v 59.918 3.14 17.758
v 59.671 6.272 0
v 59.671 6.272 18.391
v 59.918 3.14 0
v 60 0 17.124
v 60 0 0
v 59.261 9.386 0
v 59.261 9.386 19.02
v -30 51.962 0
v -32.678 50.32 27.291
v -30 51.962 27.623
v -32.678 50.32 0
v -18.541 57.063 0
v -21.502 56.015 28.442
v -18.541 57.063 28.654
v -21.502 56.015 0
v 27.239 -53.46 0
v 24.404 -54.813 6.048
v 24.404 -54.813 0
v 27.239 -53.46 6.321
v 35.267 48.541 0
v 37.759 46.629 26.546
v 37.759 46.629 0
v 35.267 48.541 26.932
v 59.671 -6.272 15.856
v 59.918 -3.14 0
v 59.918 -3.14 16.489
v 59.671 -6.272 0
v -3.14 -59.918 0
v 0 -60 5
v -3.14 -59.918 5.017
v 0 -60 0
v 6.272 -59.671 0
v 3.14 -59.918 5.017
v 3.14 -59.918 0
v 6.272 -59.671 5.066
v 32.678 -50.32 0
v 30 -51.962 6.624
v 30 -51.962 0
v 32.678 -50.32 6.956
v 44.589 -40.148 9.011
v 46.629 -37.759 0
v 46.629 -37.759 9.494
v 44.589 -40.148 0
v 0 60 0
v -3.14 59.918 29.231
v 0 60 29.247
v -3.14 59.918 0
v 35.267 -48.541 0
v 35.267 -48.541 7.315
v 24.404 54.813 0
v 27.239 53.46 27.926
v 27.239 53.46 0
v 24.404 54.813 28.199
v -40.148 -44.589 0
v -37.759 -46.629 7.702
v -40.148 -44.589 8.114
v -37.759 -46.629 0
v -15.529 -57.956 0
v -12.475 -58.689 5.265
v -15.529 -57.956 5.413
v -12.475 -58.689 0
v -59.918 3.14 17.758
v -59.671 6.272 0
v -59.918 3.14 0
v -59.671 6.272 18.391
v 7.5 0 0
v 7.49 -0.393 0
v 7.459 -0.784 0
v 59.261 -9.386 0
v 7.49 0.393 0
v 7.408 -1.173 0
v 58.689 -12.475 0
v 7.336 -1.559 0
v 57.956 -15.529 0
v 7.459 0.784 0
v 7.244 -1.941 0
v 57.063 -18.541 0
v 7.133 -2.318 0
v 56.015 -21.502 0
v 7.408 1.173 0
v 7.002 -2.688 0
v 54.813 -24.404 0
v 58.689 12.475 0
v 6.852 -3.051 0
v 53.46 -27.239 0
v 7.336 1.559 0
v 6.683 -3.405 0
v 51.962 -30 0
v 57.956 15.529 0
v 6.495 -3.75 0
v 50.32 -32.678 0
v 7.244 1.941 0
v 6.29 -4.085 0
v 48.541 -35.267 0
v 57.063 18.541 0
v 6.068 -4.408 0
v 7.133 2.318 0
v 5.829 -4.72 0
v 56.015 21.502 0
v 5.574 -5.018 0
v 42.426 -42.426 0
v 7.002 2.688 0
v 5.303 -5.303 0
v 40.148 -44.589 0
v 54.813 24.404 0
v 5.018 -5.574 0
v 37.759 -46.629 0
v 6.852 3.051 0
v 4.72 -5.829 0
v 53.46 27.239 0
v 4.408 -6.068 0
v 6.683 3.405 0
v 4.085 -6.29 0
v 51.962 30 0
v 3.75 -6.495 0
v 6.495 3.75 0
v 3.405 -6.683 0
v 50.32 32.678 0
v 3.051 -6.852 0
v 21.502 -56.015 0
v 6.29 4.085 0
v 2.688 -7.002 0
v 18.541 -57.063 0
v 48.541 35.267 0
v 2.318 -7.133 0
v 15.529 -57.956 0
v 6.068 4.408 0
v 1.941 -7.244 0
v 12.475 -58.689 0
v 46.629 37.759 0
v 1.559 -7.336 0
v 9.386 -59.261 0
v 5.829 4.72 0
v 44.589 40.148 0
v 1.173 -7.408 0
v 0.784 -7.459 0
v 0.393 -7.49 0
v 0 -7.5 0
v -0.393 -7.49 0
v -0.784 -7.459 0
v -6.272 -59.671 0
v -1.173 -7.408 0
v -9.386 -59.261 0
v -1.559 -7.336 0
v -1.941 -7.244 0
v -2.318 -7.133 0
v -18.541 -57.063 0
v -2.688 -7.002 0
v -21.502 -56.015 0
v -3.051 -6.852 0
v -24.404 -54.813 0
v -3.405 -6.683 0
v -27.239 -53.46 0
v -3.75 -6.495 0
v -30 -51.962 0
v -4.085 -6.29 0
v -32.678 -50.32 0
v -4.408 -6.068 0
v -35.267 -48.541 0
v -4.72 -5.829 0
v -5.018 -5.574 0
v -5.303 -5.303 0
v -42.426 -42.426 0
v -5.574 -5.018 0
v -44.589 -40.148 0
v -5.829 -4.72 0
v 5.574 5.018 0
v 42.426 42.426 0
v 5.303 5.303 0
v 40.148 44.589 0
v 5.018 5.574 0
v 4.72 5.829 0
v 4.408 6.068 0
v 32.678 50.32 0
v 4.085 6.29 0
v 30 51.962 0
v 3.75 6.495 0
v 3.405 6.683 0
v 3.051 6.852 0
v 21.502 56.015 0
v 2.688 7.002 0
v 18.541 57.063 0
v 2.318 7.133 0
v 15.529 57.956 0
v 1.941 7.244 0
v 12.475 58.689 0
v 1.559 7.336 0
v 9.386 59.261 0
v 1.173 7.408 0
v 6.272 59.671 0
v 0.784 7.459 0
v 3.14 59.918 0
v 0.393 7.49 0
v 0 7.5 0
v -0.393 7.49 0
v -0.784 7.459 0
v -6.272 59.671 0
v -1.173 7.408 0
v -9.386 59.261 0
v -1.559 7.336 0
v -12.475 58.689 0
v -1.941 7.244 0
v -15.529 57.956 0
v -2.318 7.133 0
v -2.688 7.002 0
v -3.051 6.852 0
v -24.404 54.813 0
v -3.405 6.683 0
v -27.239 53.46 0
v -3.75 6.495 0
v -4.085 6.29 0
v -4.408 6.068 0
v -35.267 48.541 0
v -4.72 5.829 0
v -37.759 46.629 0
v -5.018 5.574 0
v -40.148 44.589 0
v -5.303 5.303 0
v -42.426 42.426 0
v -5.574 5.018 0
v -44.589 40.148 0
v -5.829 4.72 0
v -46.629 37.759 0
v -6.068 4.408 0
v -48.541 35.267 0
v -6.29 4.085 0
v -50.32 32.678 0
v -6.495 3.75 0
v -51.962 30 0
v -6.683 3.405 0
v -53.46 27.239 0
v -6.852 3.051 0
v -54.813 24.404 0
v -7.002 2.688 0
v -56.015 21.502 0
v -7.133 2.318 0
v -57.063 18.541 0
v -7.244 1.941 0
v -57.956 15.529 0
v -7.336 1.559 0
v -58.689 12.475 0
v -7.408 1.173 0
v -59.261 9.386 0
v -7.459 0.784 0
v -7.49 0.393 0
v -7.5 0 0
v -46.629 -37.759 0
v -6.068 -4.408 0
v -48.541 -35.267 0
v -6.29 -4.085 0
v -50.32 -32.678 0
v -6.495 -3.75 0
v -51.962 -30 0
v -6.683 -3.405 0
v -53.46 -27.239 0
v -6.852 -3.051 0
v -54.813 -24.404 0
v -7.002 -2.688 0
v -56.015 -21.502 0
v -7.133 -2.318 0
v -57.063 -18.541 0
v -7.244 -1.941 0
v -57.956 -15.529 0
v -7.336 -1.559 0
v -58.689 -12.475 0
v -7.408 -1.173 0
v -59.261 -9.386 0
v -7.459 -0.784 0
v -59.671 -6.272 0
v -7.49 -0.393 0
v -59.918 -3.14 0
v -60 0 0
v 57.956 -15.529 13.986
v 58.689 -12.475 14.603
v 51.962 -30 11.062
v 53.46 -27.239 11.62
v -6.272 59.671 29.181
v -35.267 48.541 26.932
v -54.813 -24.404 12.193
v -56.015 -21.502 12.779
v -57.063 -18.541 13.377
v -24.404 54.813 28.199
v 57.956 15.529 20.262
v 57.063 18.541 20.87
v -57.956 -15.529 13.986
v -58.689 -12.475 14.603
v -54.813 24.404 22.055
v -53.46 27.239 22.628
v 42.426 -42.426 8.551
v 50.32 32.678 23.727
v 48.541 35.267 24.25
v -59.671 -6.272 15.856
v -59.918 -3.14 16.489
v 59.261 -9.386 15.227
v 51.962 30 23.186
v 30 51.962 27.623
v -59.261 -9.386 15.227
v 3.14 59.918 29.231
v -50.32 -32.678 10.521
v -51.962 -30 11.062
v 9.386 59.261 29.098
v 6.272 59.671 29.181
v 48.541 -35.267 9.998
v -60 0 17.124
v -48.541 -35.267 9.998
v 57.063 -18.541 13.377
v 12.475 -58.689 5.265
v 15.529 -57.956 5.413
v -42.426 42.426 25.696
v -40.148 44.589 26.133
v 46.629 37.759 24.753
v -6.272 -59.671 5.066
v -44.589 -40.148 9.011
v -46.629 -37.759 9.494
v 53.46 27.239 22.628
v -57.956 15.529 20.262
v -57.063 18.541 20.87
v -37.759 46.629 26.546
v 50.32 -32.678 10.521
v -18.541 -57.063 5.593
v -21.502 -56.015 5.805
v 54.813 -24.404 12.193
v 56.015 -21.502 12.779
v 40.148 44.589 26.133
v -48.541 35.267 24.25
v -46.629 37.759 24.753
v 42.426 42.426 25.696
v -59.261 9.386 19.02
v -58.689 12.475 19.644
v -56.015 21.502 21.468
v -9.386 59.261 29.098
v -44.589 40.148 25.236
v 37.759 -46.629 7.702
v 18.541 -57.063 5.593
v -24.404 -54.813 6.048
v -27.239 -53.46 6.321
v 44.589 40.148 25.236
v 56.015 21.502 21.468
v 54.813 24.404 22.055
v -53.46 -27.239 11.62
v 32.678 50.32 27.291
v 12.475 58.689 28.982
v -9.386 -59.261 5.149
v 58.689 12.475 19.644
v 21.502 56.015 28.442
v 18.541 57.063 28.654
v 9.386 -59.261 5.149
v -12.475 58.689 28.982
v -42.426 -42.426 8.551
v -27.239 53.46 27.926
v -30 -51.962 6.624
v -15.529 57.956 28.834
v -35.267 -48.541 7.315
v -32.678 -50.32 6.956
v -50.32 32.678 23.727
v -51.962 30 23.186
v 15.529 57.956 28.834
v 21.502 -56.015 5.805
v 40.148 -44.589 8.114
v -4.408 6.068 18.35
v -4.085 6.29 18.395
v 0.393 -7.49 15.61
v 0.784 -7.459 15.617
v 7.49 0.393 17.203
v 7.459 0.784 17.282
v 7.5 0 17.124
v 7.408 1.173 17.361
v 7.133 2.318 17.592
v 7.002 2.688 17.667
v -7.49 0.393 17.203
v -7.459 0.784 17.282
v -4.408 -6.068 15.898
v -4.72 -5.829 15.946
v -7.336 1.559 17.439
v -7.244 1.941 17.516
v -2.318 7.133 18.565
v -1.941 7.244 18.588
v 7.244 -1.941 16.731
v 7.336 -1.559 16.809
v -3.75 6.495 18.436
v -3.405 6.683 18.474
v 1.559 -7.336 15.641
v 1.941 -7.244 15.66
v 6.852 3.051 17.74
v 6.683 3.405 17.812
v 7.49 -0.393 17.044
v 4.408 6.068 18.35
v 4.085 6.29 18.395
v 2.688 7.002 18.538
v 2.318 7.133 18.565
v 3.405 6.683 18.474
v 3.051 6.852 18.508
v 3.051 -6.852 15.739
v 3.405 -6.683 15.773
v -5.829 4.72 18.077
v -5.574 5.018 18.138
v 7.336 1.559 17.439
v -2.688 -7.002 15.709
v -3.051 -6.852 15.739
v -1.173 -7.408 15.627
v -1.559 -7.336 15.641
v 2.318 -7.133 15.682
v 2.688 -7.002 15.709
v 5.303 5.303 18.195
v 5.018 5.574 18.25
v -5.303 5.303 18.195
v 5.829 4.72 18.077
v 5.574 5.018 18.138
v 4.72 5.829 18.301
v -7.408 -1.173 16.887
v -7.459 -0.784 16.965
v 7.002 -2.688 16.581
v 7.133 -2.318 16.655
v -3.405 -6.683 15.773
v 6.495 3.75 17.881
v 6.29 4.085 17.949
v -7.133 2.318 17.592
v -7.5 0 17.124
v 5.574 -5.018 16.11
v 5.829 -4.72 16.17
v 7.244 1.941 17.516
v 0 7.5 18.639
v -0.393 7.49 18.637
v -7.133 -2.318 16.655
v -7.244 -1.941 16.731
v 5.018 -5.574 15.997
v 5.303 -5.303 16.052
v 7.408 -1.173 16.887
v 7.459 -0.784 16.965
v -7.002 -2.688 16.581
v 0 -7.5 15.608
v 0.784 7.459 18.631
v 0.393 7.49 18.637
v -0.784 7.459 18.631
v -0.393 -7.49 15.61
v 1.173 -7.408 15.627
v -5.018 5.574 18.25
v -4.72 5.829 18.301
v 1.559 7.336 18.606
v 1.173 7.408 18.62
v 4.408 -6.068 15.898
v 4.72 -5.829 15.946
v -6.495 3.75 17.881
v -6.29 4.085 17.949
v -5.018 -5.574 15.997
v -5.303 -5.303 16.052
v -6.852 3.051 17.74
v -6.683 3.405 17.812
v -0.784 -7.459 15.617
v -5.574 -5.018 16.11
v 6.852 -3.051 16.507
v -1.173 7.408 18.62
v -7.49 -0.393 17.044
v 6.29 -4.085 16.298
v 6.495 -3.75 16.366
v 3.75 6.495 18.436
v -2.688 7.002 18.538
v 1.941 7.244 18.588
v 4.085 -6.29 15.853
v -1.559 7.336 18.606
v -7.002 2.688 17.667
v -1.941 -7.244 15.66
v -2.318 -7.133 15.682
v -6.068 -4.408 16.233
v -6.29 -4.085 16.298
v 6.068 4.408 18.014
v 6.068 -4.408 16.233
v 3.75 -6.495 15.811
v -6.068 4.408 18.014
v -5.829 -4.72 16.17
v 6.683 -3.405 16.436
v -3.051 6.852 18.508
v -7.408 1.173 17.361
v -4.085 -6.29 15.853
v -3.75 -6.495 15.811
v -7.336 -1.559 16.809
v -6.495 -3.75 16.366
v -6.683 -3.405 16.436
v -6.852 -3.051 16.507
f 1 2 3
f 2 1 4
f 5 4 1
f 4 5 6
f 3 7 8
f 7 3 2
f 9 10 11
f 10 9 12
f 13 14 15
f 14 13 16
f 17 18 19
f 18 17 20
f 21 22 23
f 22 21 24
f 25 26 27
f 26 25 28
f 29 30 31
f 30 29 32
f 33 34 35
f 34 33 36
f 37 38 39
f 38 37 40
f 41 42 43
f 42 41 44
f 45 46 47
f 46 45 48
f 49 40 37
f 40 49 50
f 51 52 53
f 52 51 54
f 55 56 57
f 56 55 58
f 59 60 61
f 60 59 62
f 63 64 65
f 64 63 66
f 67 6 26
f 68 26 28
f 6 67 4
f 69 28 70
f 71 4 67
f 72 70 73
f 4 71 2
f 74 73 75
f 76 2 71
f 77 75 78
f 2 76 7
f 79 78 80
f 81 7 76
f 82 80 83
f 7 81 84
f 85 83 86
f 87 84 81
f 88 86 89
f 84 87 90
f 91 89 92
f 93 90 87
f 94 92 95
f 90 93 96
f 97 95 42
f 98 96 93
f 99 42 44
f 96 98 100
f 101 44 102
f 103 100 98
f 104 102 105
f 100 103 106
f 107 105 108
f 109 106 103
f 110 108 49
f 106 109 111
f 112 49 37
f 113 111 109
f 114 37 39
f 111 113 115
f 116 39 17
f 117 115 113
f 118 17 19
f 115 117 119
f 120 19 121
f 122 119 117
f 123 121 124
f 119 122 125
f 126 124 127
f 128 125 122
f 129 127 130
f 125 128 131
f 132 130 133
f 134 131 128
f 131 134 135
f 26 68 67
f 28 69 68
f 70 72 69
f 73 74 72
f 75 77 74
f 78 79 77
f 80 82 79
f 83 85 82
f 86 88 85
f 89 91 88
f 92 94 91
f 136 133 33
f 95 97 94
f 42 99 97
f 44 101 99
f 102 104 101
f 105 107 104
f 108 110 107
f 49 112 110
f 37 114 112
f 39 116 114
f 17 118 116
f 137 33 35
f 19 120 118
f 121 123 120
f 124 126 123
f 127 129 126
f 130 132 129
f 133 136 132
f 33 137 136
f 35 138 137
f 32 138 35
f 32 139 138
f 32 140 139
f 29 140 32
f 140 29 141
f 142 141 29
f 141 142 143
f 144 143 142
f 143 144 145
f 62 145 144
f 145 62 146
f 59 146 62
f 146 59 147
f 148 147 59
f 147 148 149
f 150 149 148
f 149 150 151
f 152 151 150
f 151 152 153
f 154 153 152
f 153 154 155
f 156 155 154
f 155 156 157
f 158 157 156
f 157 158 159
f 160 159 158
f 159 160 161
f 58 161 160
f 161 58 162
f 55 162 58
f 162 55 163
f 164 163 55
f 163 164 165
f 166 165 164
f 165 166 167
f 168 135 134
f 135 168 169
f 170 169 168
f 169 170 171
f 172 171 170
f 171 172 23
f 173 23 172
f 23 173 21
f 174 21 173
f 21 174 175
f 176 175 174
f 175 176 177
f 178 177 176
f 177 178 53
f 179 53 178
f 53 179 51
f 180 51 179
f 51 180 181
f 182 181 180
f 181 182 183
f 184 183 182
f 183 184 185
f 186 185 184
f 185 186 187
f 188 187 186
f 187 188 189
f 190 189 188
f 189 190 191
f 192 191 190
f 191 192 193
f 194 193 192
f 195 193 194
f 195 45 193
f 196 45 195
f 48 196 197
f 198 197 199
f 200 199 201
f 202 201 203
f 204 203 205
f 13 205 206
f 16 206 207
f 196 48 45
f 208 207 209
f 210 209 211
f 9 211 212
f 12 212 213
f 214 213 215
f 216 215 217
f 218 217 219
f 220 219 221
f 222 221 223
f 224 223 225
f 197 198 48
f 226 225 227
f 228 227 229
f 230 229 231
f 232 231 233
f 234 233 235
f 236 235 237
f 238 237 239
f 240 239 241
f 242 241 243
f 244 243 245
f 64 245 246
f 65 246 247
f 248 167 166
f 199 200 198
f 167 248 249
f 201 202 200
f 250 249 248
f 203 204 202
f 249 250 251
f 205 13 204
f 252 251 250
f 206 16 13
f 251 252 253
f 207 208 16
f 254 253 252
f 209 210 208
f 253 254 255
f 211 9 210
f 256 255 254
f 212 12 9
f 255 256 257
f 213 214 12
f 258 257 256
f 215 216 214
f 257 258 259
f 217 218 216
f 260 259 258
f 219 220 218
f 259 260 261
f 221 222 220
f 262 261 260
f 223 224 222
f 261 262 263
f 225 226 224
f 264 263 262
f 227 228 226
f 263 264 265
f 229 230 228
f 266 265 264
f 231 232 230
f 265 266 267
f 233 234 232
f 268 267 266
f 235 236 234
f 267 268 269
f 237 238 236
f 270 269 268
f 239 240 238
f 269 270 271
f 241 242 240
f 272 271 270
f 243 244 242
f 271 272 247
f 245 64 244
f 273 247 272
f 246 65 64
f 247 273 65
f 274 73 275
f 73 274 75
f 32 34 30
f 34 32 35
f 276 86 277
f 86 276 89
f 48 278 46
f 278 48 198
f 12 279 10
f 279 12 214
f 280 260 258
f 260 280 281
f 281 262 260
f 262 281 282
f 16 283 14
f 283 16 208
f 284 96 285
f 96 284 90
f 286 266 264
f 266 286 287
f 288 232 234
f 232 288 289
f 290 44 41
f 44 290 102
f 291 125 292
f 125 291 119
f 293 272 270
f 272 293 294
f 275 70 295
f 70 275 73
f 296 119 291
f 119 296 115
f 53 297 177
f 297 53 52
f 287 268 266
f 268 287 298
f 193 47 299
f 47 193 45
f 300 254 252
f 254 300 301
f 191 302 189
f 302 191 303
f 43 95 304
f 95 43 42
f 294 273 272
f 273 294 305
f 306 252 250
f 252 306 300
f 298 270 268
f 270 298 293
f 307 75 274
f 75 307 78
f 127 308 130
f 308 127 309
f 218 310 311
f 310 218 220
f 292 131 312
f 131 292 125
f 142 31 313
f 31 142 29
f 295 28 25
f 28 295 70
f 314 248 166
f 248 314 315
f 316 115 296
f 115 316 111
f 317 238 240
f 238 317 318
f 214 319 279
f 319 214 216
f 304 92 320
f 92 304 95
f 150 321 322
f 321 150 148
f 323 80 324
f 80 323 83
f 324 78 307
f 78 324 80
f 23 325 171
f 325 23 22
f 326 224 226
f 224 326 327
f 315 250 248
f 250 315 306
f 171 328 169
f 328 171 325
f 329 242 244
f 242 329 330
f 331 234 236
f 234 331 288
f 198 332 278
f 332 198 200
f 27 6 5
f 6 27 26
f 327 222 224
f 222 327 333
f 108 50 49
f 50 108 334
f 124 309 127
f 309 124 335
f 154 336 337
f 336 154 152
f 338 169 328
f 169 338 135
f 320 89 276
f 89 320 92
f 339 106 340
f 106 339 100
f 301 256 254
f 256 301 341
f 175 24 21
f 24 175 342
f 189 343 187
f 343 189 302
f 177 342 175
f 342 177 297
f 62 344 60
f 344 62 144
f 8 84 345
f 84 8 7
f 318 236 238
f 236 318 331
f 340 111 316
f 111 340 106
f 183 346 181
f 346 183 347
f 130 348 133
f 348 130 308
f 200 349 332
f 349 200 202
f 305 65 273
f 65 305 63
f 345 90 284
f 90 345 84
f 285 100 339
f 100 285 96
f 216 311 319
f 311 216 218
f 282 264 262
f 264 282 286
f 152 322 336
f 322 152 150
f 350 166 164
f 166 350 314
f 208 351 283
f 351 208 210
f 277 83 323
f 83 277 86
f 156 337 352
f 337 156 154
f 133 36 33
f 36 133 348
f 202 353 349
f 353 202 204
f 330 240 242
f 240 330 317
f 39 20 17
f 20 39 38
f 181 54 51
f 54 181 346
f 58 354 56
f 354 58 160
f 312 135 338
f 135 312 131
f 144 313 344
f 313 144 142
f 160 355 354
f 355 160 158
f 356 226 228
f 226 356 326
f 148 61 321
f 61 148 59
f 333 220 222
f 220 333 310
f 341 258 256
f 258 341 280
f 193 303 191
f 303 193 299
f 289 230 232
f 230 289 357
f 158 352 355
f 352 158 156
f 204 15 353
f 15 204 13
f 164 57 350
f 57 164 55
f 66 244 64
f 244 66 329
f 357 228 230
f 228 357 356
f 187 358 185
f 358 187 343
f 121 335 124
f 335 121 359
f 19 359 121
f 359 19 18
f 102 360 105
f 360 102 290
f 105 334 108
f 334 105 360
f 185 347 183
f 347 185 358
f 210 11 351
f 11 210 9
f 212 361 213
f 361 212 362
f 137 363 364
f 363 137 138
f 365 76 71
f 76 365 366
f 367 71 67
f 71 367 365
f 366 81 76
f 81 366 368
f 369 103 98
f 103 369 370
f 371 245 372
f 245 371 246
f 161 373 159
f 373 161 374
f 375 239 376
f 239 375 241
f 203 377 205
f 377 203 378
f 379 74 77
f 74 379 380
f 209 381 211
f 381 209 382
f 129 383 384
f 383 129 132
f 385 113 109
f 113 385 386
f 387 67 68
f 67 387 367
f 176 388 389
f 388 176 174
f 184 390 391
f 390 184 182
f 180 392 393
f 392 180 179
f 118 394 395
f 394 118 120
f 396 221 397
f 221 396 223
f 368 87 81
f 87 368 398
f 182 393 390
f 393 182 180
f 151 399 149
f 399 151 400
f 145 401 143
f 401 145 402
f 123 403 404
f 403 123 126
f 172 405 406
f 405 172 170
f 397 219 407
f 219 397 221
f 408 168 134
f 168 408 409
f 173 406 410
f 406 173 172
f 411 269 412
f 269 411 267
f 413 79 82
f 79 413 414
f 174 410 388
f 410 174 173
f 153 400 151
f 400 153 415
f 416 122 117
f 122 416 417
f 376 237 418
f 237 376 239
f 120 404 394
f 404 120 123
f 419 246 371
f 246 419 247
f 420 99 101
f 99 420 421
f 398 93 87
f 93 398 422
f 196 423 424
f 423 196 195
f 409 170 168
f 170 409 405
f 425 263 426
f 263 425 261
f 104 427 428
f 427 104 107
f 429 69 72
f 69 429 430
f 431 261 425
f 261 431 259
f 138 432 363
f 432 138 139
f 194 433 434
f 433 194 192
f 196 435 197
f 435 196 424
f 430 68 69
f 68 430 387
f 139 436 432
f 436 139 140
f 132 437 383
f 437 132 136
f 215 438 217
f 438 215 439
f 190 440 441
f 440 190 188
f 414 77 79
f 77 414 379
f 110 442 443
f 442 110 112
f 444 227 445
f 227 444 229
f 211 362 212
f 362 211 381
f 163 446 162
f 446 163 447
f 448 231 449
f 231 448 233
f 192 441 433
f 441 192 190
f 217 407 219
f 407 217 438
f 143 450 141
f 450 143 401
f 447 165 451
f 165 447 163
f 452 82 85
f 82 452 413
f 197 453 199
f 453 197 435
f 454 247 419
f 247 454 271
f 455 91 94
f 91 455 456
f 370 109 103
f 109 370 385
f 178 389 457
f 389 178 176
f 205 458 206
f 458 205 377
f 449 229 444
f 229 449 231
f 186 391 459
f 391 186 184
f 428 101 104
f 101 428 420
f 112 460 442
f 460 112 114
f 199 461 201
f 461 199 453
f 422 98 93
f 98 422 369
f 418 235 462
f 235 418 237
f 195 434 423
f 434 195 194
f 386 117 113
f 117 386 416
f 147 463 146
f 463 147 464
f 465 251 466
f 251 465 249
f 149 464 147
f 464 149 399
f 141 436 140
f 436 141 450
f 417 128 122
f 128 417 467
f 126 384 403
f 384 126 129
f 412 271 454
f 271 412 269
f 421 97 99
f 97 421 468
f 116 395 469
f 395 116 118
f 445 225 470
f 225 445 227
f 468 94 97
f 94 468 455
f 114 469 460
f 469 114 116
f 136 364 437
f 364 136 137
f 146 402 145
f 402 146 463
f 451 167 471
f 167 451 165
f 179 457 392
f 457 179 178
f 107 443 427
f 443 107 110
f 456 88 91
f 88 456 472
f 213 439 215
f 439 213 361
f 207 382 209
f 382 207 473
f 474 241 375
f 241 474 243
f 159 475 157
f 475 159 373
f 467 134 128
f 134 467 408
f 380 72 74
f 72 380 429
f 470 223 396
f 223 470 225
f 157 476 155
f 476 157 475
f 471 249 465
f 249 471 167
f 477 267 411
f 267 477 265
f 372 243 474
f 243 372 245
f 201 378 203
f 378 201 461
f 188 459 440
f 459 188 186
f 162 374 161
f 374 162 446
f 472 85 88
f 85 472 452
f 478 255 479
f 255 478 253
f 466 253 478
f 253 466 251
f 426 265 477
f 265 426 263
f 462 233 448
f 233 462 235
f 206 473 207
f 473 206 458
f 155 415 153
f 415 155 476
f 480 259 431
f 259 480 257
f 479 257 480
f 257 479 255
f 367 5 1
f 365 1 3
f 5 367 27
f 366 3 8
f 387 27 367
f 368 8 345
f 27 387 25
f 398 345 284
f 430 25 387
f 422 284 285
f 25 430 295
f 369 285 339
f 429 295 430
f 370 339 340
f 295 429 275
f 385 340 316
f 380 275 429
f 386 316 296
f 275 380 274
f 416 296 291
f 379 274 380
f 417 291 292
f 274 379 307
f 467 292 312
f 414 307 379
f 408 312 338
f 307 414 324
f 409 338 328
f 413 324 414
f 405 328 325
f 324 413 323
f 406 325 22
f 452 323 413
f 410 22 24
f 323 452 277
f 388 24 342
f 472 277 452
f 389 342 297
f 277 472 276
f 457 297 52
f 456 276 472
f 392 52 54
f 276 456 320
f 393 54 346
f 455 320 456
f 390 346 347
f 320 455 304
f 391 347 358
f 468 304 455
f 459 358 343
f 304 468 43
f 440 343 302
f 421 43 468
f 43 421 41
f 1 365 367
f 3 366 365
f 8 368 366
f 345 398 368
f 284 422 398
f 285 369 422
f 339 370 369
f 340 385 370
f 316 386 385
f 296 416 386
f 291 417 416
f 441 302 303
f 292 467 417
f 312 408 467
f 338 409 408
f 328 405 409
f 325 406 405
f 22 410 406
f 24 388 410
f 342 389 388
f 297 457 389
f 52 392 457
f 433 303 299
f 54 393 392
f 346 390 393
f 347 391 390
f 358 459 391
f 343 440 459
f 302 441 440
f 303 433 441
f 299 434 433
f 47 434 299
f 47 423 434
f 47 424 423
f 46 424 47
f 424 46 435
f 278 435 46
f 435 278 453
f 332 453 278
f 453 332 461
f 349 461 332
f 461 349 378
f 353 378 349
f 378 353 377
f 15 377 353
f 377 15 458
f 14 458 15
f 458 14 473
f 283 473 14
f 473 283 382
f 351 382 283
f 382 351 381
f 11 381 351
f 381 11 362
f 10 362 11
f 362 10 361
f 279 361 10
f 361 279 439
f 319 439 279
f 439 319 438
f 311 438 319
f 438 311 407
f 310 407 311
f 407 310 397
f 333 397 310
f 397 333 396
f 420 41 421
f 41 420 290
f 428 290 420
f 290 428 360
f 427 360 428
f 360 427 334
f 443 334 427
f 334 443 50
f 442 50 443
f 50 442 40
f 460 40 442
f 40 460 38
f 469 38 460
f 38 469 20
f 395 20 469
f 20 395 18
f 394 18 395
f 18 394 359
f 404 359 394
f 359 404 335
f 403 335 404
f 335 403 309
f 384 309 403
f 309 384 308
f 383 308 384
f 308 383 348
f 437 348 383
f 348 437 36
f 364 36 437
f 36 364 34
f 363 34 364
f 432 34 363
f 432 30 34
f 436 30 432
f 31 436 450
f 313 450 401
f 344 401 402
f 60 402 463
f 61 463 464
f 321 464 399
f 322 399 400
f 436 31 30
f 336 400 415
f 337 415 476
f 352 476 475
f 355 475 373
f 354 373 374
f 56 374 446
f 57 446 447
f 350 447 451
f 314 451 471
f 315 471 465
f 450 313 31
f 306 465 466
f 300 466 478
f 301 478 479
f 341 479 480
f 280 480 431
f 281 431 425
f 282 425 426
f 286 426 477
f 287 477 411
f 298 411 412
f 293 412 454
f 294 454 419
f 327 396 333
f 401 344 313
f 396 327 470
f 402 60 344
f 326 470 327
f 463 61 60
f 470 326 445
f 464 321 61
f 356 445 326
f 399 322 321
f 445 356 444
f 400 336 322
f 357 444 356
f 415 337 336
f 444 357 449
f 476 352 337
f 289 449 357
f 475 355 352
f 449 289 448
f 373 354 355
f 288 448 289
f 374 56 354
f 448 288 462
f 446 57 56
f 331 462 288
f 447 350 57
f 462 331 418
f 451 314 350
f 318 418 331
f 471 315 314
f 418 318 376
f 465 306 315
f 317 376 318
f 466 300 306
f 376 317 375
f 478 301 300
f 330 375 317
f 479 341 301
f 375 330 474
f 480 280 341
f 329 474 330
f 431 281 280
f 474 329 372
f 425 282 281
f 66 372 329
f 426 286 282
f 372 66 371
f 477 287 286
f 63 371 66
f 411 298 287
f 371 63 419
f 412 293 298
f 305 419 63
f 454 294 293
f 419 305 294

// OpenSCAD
//**************************************************************************
//*   
//*   Configurable CD/DVD Doorstop
//*   dimensions (all in mm)
//*   Created by Keith Welker
//*   10 April 2016
//**************************************************************************

FN = 120;//$fn for cylinders (resolution)
ID = 15; //CD inner diameter - 15 recommended
OD = 120; // CD outer diameter - 120 recommended
Hmin = 5; // minimum height of doorstop
Hmax = 30; // maximum height of doorstop
 
CD_DoorStop();

module CD_DoorStop()
{
    delta = .015; // small delta size for cutouts
    os = Hmin + (Hmax-Hmin)/2;
    difference()
    {
        cylinder(Hmax, d=OD, $fn = FN);
        //remove the inner hole
        translate([0,0,-delta])
        cylinder(Hmax+2*delta, d=ID, $fn = FN);
        //remove the top to form a wedge...
        translate([-OD*1.25/2, -OD/2, Hmin])
        rotate(a = asin((Hmax-Hmin)/OD)*.95, v=[1,0,0])
        cube([OD*1.25, OD*1.25, Hmax]);
    }
}
